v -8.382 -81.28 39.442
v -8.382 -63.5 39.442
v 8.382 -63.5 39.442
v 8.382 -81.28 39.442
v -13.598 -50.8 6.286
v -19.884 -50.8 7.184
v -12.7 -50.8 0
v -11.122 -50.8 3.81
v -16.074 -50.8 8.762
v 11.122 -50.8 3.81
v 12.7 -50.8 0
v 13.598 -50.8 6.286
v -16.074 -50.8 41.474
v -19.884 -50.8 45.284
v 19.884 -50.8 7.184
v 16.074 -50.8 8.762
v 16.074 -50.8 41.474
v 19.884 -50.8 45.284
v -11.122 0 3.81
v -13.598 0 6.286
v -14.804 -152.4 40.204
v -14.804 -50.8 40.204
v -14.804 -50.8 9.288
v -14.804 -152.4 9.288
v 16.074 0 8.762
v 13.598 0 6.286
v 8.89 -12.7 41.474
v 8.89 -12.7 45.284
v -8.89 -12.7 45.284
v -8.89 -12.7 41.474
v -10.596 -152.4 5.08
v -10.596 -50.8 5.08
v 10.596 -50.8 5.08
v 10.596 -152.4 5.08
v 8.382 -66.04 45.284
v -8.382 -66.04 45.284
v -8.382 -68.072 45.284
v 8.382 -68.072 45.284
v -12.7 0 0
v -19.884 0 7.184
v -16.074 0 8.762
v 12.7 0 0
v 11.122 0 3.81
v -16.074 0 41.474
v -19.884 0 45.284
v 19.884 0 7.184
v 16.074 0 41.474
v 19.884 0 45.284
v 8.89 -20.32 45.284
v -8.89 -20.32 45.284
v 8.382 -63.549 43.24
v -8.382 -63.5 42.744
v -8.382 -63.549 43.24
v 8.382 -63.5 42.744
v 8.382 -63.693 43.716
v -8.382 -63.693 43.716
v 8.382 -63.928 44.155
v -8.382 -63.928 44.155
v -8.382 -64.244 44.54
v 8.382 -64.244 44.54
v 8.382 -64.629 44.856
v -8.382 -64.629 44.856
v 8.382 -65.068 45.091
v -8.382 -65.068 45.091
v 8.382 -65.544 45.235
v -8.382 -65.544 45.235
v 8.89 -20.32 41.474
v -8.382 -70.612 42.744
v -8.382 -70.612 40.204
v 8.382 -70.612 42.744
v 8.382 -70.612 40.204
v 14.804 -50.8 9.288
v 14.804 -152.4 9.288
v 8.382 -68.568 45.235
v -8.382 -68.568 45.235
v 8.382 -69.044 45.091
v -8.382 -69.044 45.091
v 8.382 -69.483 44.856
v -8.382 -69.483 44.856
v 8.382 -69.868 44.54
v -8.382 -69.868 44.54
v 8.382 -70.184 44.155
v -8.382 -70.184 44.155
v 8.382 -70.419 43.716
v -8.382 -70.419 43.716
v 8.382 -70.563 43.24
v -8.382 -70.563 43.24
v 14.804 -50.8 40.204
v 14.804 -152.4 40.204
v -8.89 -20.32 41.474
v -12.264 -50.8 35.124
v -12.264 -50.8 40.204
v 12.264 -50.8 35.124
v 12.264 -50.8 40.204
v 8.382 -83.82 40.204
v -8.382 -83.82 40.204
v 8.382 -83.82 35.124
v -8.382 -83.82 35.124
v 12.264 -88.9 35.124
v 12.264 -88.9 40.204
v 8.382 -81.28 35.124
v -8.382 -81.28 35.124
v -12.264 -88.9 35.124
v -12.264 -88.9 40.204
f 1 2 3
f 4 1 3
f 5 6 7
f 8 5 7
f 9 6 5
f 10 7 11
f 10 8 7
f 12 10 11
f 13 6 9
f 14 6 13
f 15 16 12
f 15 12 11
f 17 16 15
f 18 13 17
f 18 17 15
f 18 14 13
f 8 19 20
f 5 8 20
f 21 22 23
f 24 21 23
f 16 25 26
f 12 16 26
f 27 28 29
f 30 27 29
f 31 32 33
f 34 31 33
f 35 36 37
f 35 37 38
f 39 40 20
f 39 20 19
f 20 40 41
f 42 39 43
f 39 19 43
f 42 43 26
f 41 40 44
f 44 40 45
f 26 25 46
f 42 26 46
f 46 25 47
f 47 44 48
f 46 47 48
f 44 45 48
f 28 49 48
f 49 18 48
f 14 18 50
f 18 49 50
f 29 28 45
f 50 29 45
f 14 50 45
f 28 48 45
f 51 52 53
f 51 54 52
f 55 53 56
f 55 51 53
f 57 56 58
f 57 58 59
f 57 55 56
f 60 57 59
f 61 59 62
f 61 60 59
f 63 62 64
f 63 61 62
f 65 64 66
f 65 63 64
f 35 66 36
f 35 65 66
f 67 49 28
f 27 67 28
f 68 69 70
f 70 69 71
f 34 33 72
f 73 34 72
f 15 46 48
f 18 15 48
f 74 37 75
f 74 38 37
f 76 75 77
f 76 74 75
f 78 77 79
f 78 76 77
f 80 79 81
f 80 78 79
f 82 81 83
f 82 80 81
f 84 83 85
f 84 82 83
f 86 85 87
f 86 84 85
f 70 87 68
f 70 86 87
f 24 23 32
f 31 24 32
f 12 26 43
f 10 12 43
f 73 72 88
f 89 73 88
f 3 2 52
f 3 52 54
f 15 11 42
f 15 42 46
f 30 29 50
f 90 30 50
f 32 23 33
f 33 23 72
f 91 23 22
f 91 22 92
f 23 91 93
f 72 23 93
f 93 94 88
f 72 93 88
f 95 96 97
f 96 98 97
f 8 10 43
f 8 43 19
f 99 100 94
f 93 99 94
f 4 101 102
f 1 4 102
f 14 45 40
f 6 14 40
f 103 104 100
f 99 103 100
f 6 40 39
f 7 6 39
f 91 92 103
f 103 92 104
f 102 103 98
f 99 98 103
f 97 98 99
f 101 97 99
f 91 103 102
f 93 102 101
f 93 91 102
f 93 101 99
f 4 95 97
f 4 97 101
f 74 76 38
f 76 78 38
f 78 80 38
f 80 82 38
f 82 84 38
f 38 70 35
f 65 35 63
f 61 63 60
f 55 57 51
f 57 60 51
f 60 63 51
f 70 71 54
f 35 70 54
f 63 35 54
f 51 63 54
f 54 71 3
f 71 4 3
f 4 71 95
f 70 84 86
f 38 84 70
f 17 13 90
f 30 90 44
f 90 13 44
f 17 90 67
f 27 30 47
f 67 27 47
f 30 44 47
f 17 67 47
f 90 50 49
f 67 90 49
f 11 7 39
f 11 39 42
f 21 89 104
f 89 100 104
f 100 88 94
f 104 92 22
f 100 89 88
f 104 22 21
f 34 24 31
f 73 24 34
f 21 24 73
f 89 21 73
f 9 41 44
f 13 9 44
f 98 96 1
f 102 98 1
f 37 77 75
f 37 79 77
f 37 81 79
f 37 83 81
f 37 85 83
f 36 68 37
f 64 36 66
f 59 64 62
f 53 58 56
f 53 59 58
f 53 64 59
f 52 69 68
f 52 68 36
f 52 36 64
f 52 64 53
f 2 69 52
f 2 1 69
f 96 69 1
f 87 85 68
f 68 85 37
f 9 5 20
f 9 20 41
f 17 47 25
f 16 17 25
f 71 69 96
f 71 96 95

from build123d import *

# Parameters (mm, degrees)
F1_DEPTH  = 50.8
F3_DEPTH  = 101.6
F5_DEPTH  = 25.4
F7_DEPTH  = 5.08
F9_DEPTH  = 4.318
F10_W     = 8.382
F10_H     = 17.78
F10_H_2   = 2.54
F11_DEPTH = 0.762
F12_W     = 16.764
F12_H     = 7.112
F13_DEPTH = 5.08
F14_R     = 2.54


with BuildPart() as f1:
    # F0 (on Front) → F1 (new body)
    with BuildSketch(Plane.XZ):
        Polygon((-12.7, 0), (0, 0), (0, 3.81), (-11.121846, 3.81), (-13.598026, 6.286179), (-16.074205, 8.762359), (-16.074205, 11.265247), (-16.074205, 41.474205), (0, 41.474205), (0, 45.284205), (-19.884205, 45.284205), (-19.884205, 7.184205), align=None)
        Polygon((0, 3.81), (0, 0), (12.7, 0), (19.884205, 7.184205), (19.884205, 45.284205), (0, 45.284205), (0, 41.474205), (16.074205, 41.474205), (16.074205, 11.265247), (16.074205, 8.762359), (13.598026, 6.286179), (11.121846, 3.81), align=None)
    extrude(amount=F1_DEPTH)

    # F4 (on face) → F5 (cut)
    with BuildSketch(Plane.XY.offset(45.284205)):
        Polygon((8.89, -12.7), (0, -12.7), (-8.89, -12.7), (-8.89, -20.32), (0, -20.32), (8.89, -20.32), align=None)
    extrude(amount=-F5_DEPTH, mode=Mode.SUBTRACT)


with BuildPart() as f3:
    # F2 (on face) → F3 (new body)
    with BuildSketch(Plane.XZ.offset(50.8)):
        Polygon((0, 40.204205), (0, 5.08), (10.595795, 5.08), (14.804205, 9.28841), (14.804205, 40.204205), (4.39494, 40.204205), align=None)
        Polygon((-10.595795, 5.08), (0, 5.08), (0, 40.204205), (-4.39494, 40.204205), (-14.804205, 40.204205), (-14.804205, 9.28841), align=None)
    extrude(amount=F3_DEPTH)

    # F6 (on face) → F7 (cut)
    with BuildSketch(Plane.XY.offset(40.204205)):
        Polygon((12.264205, -50.8), (-12.264205, -50.8), (-12.264205, -88.9), (0, -88.9), (12.264205, -88.9), align=None)
    extrude(amount=-F7_DEPTH, mode=Mode.SUBTRACT)

    # F8 (on face) → F9 (join)
    with BuildSketch(Plane.XY.offset(35.124205)):
        Polygon((-8.382, -83.82), (0, -83.82), (8.382, -83.82), (8.382, -81.28), (0, -81.28), (-8.382, -81.28), align=None)
    extrude(amount=F9_DEPTH)

    # F10 (on face) → F11 (join)
    with BuildSketch(Plane.XY.offset(39.442205)):
        with Locations((-4.191, -72.39)):
            Rectangle(F10_W, F10_H)
        with Locations((4.191, -72.39)):
            Rectangle(F10_W, F10_H)
        with Locations((4.191, -82.55)):
            Rectangle(F10_W, F10_H_2)
        with Locations((-4.191, -82.55)):
            Rectangle(F10_W, F10_H_2)
    extrude(amount=F11_DEPTH)

    # F12 (on face) → F13 (join)
    with BuildSketch(Plane.XY.offset(40.204205)):
        with Locations((0, -67.056)):
            Rectangle(F12_W, F12_H)
    extrude(amount=F13_DEPTH)

    # F14
    f14_edges = [f3.edges().sort_by_distance(p)[0] for p in [
        (0, -63.5, 45.284205),
        (0, -70.612, 45.284205),
    ]]
    fillet(f14_edges, radius=F14_R)


solid = Compound([f1.part, f3.part])
